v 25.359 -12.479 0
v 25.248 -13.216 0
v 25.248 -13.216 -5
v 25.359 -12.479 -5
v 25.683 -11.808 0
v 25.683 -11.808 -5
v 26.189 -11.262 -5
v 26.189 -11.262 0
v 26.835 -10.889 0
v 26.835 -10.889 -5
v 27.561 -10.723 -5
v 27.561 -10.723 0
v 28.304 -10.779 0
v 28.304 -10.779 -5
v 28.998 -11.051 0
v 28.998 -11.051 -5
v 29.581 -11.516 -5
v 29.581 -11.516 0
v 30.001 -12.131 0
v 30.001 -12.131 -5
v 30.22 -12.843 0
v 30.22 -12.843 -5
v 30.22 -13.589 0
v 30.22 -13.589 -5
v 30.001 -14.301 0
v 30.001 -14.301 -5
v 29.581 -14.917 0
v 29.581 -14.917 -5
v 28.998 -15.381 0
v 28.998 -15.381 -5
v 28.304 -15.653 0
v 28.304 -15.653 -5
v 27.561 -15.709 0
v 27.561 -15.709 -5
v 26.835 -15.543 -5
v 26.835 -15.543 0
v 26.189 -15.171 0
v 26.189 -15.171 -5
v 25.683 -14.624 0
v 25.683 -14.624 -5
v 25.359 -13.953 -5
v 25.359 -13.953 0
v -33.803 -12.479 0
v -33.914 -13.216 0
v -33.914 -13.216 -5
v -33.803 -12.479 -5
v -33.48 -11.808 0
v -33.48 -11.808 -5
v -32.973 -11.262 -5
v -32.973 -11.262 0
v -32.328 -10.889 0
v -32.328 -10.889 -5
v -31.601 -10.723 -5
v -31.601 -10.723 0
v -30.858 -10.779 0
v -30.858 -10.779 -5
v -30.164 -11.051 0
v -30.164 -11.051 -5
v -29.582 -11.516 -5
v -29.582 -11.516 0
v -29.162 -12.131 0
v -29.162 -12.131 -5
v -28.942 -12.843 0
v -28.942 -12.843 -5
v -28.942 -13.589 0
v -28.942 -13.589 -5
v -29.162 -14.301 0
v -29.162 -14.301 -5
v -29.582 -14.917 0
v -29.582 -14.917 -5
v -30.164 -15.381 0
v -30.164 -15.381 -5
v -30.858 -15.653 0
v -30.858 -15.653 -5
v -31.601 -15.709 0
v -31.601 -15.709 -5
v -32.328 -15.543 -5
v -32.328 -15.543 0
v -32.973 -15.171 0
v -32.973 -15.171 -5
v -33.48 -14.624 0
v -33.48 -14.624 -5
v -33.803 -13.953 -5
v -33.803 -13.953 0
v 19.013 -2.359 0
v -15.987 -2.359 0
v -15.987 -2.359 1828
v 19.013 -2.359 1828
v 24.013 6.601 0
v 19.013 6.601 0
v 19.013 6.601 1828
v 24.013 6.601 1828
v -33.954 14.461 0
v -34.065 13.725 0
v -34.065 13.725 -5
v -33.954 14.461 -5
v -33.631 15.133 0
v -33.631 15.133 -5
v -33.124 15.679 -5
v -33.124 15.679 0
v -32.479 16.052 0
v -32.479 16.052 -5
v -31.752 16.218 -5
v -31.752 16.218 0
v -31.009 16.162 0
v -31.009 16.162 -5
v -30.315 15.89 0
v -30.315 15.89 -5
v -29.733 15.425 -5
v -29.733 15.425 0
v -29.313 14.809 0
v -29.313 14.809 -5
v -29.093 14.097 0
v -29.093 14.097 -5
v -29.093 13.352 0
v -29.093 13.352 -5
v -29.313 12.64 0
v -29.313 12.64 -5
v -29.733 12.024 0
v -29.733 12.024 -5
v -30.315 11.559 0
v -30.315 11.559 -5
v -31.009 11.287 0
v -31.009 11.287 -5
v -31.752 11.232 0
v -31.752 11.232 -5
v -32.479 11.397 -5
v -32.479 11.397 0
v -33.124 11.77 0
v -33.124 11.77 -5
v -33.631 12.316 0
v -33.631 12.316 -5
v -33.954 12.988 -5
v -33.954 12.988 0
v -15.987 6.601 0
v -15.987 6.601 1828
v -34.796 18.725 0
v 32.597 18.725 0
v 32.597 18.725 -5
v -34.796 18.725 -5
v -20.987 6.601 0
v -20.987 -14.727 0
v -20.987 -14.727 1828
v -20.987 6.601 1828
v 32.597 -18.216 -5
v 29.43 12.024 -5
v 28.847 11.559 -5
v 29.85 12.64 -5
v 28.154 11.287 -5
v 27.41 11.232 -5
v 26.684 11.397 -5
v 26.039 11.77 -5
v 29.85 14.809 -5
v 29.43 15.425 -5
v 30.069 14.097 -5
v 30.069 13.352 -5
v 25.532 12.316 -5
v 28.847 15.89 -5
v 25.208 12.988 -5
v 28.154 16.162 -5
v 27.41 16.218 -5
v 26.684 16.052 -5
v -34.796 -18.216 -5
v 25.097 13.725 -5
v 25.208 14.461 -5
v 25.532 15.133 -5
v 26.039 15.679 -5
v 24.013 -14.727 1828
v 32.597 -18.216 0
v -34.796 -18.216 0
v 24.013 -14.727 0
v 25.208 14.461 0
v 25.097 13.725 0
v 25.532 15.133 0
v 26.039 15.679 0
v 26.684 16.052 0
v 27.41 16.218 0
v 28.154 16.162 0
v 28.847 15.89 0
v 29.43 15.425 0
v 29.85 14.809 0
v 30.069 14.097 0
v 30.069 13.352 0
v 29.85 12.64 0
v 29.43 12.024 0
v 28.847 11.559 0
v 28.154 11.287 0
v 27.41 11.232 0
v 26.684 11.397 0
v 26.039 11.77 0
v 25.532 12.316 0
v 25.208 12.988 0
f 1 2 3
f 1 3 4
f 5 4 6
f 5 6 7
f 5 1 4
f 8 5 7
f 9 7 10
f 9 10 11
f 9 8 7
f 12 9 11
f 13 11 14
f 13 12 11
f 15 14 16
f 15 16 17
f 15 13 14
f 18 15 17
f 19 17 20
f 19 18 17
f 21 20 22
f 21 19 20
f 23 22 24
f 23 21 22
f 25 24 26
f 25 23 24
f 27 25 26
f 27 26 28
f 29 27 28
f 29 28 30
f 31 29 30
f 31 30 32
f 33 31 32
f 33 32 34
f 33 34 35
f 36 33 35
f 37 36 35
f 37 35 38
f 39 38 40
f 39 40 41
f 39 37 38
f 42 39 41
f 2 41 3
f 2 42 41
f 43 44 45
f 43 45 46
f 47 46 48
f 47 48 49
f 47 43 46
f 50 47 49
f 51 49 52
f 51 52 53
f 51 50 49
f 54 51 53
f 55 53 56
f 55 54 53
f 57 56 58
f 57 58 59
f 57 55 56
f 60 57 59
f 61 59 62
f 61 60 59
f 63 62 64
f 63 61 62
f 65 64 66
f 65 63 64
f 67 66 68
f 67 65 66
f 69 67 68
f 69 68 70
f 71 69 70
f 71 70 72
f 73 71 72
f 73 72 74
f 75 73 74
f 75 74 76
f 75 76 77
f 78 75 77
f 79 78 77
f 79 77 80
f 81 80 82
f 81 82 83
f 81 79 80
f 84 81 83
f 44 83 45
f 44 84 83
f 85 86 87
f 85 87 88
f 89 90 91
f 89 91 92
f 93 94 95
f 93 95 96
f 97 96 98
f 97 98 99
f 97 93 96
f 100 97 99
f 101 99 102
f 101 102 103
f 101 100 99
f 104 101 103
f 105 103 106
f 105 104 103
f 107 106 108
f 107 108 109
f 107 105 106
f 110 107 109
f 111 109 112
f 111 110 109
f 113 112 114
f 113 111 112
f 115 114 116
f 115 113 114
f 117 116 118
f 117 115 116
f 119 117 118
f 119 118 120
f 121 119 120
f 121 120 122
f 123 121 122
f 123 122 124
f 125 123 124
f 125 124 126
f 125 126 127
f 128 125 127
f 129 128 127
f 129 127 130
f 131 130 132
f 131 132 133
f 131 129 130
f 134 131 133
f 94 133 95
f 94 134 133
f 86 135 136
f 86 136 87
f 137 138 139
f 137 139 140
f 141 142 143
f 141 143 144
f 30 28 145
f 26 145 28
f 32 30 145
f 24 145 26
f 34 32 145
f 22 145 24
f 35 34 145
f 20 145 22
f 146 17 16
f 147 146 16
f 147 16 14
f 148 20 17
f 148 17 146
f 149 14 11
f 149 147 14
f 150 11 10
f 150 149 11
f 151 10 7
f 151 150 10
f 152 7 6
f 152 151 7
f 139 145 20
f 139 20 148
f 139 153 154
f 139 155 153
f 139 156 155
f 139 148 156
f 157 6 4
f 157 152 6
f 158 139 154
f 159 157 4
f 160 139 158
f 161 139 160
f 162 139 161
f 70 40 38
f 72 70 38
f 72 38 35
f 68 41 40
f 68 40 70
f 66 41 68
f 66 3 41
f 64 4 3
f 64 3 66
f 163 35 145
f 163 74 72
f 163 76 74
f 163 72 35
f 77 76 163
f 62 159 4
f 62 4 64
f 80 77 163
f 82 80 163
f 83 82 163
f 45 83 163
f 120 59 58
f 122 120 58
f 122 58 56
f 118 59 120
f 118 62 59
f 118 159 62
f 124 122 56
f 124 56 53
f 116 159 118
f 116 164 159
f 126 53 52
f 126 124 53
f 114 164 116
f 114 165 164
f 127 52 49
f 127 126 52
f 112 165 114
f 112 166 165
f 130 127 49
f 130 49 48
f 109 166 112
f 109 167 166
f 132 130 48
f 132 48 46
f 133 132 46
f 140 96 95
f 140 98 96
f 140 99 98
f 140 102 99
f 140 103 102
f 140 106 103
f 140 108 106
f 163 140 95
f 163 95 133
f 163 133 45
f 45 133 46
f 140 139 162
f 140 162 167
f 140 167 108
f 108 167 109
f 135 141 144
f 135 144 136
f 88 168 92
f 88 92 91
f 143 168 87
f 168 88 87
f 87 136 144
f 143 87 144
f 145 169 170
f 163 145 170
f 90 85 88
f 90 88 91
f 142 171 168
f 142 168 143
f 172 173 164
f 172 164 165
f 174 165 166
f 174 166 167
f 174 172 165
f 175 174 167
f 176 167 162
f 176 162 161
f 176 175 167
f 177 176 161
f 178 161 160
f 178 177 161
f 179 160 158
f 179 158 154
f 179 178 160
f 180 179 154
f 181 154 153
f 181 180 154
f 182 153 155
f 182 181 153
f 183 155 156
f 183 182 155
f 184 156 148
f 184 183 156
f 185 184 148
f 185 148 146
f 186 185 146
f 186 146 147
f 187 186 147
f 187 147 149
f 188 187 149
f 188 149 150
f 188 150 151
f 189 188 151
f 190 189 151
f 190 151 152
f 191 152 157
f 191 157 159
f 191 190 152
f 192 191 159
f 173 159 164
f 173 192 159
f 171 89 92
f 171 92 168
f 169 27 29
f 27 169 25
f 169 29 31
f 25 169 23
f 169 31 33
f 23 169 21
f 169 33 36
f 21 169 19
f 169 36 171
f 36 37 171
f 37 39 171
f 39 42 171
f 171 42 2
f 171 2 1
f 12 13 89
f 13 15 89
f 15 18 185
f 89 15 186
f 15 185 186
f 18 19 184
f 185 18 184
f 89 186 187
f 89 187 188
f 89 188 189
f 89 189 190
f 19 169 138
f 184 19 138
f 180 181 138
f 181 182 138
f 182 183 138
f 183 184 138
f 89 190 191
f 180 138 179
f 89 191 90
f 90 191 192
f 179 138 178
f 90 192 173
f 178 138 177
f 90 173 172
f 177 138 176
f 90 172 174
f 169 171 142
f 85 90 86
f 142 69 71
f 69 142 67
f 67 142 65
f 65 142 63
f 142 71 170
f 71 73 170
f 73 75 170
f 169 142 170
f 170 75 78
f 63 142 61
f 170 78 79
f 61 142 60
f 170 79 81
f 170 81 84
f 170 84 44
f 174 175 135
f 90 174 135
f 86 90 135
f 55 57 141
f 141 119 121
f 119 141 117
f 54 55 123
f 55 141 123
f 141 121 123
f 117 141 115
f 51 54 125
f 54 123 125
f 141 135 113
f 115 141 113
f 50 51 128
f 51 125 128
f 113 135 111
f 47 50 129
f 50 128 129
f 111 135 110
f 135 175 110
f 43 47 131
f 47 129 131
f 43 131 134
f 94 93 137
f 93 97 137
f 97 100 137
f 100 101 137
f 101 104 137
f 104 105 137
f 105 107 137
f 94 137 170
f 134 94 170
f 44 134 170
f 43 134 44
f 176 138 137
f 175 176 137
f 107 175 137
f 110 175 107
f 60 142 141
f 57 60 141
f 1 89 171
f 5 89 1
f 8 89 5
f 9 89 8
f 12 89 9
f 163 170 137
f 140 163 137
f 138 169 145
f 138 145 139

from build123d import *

# Parameters (mm, degrees)
BOSS_EXTRUDE1_DEPTH = 1828
SKETCH2_W           = 67.392754287
SKETCH2_H           = 36.940615493
SKETCH2_R           = 2.5
BOSS_EXTRUDE2_DEPTH = 5


with BuildPart() as part:
    # Sketch1 → Boss-Extrude1 (new body)
    with BuildSketch(Plane.XY):
        Polygon((-20.987492455, 6.600745666), (-15.987492455, 6.600745666), (-15.987492455, -2.358820079), (19.012507545, -2.358820079), (19.012507545, 6.600745666), (24.012507545, 6.600745666), (24.012507545, -14.726832534), (-20.987492455, -14.726832534), align=None)
    extrude(amount=BOSS_EXTRUDE1_DEPTH)

    # Sketch2 → Boss-Extrude2 (add)
    with BuildSketch(Plane(origin=(0, 0, 0), x_dir=(-1, 0, 0), z_dir=(0, 0, -1))):
        with Locations((1.099137048, 0.254222391)):
            Rectangle(SKETCH2_W, SKETCH2_H)
        with Locations((-27.597240096, 13.724530137)):
            Circle(SKETCH2_R, mode=Mode.SUBTRACT)
        with Locations((31.565303785, 13.724530137)):
            Circle(SKETCH2_R, mode=Mode.SUBTRACT)
        with Locations((31.414421828, -13.216085356)):
            Circle(SKETCH2_R, mode=Mode.SUBTRACT)
        with Locations((-27.748122053, -13.216085356)):
            Circle(SKETCH2_R, mode=Mode.SUBTRACT)
    extrude(amount=BOSS_EXTRUDE2_DEPTH)


solid = part.part
